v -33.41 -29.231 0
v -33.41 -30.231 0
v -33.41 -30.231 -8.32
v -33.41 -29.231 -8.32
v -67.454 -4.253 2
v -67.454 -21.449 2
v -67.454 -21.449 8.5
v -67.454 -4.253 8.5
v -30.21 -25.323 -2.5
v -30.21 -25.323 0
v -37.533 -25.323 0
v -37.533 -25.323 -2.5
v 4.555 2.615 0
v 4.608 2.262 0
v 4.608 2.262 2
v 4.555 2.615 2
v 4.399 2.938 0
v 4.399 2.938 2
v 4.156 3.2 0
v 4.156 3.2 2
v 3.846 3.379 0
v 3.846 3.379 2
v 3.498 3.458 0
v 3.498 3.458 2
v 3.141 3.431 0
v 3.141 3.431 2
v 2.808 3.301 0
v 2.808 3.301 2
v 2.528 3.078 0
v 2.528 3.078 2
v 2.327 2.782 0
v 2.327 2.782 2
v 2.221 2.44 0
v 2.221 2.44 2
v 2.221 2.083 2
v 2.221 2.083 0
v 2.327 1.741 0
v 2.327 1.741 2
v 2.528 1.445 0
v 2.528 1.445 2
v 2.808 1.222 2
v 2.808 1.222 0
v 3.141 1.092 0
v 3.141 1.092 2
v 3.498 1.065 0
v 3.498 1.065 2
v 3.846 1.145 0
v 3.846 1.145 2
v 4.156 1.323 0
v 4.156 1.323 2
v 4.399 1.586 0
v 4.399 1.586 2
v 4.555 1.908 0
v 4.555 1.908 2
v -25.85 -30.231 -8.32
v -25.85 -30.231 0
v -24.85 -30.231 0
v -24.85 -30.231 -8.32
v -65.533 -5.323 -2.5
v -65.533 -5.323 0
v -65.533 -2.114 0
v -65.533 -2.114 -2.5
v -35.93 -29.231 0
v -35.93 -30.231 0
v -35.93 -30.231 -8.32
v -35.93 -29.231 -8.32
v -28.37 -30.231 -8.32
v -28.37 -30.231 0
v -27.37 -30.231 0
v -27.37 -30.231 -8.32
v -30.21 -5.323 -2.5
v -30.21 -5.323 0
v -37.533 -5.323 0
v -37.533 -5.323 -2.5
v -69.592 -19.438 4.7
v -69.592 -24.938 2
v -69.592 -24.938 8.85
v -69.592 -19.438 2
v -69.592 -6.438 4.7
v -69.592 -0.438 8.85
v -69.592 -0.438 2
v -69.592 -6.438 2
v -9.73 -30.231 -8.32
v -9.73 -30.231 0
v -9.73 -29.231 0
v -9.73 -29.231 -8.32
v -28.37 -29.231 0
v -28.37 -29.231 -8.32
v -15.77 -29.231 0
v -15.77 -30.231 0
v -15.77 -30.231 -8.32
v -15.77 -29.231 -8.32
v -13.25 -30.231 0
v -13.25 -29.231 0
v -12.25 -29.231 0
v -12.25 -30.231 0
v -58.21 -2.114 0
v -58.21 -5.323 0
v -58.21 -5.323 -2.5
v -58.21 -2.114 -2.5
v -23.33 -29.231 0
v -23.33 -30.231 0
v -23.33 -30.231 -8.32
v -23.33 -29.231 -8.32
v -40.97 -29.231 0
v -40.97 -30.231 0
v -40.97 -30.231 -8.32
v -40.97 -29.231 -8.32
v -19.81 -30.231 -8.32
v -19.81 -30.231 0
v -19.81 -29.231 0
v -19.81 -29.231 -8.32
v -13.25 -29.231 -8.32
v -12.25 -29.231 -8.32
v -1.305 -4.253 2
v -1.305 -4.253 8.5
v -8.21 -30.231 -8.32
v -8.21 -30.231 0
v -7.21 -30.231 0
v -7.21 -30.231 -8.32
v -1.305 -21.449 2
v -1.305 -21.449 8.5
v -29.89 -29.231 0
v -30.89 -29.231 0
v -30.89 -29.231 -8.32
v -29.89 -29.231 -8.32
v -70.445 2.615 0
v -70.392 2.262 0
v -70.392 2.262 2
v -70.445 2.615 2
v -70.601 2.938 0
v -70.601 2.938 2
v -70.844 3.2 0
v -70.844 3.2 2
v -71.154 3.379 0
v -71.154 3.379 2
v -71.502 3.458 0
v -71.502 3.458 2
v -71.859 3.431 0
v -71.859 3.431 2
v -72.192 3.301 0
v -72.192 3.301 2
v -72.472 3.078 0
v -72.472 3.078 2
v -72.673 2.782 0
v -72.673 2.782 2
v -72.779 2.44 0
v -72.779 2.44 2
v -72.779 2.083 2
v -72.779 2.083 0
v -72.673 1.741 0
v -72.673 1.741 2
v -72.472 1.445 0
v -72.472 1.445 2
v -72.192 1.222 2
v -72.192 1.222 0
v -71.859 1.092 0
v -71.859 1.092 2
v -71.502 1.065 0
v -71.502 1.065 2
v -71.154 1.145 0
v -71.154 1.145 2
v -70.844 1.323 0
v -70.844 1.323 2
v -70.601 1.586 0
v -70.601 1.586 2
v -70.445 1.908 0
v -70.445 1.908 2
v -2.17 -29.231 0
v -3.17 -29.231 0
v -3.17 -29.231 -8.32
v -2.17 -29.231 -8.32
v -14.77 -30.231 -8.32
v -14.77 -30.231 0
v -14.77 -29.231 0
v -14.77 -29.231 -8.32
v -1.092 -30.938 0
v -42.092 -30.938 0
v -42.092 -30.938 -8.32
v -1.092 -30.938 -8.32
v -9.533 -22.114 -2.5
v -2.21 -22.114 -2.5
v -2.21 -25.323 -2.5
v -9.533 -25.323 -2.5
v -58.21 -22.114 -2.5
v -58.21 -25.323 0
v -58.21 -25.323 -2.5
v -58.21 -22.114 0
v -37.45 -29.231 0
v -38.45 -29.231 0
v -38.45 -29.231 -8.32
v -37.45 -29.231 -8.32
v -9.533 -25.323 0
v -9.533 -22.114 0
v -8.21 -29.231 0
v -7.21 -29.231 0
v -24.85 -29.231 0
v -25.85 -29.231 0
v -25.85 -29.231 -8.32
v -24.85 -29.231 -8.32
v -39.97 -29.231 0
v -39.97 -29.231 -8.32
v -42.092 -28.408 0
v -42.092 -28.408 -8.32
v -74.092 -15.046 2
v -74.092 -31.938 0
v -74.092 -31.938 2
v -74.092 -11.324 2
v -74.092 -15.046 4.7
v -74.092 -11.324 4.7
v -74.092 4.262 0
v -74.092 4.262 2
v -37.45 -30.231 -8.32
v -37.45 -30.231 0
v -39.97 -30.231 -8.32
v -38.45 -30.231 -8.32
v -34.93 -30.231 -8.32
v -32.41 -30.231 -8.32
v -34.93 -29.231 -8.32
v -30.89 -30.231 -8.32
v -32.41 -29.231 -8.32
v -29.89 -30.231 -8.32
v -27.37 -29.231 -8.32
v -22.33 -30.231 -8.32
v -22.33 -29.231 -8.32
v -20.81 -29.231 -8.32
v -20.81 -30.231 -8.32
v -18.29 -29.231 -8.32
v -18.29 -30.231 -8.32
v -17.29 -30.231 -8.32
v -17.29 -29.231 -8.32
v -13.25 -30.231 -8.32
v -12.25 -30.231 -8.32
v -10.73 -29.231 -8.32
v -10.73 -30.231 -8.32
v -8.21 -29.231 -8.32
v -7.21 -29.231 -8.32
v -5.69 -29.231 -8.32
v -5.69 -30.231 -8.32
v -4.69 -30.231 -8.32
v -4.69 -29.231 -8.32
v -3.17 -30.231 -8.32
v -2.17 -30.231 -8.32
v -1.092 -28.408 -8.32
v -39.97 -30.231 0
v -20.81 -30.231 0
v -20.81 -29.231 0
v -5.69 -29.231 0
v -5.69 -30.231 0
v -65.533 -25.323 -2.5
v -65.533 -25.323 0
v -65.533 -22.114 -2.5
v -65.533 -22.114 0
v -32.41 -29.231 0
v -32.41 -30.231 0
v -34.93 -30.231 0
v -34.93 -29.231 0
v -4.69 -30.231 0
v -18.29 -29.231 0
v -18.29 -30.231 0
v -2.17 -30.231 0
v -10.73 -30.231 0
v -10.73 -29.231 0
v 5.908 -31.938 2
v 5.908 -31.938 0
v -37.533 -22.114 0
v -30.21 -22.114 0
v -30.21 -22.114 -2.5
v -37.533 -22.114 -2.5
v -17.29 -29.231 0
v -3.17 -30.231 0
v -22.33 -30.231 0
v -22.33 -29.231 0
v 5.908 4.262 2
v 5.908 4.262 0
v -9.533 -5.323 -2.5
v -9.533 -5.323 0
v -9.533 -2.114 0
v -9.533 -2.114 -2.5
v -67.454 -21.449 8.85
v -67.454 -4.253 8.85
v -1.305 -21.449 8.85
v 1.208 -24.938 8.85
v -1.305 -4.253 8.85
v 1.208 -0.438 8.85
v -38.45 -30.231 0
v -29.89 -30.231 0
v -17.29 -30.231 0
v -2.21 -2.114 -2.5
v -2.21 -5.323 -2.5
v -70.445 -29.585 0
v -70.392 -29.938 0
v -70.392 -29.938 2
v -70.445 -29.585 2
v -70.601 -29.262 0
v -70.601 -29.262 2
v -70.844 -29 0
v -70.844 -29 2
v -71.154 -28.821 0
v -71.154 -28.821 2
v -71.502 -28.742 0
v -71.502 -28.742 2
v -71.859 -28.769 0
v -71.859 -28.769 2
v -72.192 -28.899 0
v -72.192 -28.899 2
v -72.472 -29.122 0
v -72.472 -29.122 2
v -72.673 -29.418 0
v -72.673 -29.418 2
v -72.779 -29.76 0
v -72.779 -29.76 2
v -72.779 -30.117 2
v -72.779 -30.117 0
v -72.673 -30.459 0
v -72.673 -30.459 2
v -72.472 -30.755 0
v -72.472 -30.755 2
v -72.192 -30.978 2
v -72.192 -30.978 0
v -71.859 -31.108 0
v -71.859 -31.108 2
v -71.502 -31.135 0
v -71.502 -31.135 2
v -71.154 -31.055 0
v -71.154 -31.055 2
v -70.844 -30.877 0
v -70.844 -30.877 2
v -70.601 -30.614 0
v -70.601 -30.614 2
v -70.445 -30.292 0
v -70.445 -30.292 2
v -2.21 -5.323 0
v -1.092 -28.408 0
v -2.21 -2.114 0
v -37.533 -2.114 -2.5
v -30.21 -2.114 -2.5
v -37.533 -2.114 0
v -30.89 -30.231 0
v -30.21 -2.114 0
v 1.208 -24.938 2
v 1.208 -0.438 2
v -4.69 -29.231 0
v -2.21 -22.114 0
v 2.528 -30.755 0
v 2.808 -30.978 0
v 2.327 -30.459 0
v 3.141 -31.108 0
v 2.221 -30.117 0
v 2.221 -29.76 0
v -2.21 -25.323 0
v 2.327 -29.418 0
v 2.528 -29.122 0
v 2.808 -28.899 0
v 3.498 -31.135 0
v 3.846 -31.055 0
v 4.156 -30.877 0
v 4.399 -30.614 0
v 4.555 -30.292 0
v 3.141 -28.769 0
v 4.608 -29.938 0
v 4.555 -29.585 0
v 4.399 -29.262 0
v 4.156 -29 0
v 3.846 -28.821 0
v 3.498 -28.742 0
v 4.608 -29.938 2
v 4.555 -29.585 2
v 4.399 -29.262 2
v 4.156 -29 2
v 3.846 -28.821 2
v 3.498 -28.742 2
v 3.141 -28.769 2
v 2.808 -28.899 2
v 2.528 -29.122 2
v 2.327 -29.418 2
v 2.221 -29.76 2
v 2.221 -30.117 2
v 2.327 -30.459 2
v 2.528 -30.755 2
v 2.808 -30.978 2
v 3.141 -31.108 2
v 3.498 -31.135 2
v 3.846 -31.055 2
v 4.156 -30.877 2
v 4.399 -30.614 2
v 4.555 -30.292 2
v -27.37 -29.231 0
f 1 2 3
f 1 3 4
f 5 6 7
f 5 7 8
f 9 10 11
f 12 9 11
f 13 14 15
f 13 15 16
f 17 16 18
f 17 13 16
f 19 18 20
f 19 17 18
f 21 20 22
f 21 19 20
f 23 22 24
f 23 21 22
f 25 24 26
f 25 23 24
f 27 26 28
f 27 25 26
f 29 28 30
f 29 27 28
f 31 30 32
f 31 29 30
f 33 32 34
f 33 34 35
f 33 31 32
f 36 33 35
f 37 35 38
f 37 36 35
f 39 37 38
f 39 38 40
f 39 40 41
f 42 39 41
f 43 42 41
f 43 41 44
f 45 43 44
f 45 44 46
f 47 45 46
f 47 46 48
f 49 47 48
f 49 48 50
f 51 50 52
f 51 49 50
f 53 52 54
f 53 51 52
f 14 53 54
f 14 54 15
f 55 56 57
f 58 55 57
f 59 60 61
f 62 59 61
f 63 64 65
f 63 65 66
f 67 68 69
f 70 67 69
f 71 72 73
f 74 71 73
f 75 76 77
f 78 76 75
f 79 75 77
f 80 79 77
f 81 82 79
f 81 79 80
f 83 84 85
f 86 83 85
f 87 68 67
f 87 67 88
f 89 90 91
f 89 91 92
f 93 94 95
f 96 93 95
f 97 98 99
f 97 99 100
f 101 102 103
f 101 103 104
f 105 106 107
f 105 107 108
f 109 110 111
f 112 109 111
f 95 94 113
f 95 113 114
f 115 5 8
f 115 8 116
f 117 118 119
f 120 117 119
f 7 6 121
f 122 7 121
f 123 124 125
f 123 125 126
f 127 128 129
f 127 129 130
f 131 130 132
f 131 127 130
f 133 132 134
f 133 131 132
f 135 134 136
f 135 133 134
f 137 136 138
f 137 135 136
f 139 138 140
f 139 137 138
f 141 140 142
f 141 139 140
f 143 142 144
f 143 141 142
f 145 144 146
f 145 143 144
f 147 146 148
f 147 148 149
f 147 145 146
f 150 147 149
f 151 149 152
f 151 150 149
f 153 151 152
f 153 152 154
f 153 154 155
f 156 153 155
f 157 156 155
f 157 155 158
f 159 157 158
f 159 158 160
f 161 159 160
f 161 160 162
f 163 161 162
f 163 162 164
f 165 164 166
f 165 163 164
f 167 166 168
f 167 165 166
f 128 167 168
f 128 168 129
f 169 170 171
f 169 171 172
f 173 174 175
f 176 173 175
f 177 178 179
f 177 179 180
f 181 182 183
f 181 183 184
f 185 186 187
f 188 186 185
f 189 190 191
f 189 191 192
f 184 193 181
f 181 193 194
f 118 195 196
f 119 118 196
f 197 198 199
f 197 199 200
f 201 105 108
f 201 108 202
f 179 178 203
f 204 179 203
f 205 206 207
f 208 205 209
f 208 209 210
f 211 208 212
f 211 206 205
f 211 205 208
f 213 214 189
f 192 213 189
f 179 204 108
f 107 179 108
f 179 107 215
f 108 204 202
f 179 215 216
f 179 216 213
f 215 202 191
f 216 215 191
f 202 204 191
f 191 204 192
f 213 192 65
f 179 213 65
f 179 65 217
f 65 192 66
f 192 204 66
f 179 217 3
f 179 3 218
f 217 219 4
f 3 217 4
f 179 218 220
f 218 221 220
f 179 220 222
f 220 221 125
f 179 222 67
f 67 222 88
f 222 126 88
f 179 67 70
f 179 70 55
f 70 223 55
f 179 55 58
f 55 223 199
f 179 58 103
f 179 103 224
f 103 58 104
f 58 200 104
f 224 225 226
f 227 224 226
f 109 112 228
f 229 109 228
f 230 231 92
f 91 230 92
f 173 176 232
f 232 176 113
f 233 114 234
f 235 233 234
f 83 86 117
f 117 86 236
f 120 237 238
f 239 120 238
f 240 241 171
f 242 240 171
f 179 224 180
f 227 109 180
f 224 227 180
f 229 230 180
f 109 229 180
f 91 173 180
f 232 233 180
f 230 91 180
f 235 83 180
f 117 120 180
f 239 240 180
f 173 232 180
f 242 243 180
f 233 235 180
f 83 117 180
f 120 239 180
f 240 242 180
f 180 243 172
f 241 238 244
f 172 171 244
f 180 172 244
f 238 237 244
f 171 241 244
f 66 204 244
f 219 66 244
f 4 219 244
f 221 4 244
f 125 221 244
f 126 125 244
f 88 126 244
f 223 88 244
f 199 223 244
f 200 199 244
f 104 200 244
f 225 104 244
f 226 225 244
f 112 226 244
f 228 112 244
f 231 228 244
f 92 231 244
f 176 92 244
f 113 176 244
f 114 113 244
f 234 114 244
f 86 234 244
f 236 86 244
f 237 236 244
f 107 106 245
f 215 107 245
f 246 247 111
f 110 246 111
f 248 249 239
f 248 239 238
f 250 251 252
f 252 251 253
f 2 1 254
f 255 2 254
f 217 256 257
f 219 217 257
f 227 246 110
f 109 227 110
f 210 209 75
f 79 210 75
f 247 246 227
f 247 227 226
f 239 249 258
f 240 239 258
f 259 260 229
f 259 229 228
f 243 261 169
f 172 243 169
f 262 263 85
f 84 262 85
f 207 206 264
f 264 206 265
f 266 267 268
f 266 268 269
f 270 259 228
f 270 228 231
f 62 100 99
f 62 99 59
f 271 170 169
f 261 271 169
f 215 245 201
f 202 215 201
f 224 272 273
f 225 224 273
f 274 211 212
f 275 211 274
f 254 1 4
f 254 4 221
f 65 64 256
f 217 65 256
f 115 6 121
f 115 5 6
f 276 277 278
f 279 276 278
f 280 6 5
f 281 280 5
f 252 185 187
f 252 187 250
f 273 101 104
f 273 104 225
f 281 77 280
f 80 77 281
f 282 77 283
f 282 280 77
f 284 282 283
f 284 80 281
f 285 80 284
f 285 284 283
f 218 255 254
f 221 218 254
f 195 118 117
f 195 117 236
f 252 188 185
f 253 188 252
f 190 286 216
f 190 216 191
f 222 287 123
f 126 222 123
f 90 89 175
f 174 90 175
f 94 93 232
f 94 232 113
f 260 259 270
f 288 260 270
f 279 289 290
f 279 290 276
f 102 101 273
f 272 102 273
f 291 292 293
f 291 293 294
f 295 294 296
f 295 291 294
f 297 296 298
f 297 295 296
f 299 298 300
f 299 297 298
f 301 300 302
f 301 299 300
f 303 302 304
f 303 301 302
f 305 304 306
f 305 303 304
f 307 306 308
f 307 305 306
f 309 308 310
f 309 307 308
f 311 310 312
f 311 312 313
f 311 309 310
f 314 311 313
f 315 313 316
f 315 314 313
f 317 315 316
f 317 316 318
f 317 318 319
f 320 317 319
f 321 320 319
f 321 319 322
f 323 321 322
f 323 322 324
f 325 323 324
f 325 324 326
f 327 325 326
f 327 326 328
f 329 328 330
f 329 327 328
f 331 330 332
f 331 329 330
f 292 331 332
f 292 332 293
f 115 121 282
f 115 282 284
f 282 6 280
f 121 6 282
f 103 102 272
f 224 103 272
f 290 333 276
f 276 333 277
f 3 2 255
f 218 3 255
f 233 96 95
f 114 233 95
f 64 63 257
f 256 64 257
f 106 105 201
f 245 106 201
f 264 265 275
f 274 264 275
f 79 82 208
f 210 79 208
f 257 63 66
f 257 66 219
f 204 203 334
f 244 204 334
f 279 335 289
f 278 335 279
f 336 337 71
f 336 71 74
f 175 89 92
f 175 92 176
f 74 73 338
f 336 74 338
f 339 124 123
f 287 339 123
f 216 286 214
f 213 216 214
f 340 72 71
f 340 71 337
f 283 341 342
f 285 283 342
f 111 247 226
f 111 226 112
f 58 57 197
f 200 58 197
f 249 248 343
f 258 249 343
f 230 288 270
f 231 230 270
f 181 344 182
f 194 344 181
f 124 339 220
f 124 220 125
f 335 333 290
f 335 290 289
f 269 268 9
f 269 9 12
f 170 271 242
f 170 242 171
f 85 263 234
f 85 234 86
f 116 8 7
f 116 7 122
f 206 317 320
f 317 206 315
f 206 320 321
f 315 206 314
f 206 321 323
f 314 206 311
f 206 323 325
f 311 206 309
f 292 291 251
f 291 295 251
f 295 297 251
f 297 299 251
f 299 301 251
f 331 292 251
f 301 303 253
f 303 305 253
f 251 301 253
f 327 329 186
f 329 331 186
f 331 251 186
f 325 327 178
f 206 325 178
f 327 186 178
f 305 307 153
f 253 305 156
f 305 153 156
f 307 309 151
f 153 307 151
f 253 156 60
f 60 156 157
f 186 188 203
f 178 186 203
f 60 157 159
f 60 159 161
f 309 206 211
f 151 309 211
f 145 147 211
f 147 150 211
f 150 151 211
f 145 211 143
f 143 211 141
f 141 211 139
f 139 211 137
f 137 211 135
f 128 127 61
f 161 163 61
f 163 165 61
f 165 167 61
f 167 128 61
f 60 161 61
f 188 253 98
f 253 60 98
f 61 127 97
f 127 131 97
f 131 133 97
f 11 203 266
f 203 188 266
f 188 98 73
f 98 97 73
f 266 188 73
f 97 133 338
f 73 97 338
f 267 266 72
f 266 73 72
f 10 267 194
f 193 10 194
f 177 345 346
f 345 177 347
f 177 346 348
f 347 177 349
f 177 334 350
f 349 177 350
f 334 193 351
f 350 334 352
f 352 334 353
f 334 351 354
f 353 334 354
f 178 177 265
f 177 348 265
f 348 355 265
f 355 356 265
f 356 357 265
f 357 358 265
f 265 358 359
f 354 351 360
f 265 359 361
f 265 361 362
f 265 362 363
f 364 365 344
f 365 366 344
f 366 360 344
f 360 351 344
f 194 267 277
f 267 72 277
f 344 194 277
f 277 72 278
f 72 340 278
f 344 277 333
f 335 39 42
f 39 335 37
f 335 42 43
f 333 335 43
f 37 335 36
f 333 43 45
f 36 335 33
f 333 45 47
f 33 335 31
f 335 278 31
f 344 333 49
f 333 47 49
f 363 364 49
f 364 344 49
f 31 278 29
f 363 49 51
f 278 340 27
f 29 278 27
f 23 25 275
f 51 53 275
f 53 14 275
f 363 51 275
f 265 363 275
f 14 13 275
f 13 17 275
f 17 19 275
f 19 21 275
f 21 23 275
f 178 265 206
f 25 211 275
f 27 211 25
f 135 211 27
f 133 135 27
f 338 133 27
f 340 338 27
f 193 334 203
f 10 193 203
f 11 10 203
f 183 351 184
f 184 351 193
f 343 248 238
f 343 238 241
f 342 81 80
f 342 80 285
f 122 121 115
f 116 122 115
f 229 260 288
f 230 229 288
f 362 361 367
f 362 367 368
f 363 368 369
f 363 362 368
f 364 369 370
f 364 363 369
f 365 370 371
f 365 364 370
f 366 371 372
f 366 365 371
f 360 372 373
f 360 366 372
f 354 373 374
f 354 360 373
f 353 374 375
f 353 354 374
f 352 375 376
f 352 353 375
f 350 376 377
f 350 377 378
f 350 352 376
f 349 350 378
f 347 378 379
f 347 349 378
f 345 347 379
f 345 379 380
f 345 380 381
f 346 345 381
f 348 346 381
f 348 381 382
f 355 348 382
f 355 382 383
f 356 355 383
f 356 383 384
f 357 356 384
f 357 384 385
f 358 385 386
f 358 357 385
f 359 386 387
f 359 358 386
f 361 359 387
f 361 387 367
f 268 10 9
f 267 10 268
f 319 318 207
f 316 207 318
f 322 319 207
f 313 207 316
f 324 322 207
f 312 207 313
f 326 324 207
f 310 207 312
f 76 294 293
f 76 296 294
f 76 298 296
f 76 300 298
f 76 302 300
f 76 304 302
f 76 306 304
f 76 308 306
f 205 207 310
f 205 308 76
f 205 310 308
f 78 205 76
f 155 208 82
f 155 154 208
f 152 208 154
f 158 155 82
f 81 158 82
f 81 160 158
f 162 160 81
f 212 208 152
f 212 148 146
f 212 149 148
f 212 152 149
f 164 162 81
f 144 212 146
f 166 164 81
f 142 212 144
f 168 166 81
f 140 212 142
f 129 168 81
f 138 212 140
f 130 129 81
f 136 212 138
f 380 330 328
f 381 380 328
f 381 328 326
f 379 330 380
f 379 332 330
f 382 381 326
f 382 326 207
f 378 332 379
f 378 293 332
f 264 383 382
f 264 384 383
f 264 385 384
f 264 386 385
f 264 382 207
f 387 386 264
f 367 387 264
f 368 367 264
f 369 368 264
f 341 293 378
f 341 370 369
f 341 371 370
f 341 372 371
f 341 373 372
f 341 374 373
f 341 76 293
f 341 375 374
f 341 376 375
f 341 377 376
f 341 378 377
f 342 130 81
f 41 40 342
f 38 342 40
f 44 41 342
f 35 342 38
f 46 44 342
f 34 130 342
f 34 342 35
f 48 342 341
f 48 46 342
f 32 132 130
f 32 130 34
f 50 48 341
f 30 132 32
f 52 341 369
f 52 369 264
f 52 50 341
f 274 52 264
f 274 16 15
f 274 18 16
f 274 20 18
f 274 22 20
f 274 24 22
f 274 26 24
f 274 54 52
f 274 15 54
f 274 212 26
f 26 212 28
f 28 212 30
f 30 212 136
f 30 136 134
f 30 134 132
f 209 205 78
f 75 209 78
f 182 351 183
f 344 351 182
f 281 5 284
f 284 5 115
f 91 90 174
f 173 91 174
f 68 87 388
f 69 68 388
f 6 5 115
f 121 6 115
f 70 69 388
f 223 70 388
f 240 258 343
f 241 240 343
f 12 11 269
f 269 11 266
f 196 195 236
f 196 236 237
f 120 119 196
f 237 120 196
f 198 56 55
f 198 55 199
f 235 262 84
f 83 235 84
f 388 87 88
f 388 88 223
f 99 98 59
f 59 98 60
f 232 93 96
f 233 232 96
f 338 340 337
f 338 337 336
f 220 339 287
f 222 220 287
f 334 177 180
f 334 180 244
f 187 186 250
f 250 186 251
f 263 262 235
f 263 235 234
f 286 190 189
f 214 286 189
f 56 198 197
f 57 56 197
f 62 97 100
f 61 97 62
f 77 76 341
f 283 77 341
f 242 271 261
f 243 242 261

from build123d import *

# Parameters (mm, degrees)
SKETCH_2_W      = 80
SKETCH_2_H      = 36.2
SKETCH_2_R      = 1.2
EXTRUDE_1_DEPTH = 2
SKETCH_3_W      = 70.8
SKETCH_3_H      = 24.5
SKETCH_3_W_2    = 66.149074023
SKETCH_3_H_2    = 17.195468247
EXTRUDE_2_DEPTH = 8.849661681
SKETCH_4_W      = 66.149074023
SKETCH_4_H      = 17.195468247
EXTRUDE_3_DEPTH = 6.5
SKETCH_6_W      = 41
SKETCH_6_H      = 2.53
SKETCH_6_W_2    = 1
SKETCH_6_H_2    = 1
EXTRUDE_4_DEPTH = 10.32
EXTRUDE_5_DEPTH = 2.7
SKETCH_8_W      = 7.322472125
SKETCH_8_H      = 3.20872374
EXTRUDE_6_DEPTH = 2.5


with BuildPart() as part:
    # 草图2 → 凸台-拉伸1 (new body)
    with BuildSketch(Plane.XY):
        with Locations((-34.091991963, -13.838432836)):
            Rectangle(SKETCH_2_W, SKETCH_2_H)
        with Locations((3.408008037, -29.938432836)):
            Circle(SKETCH_2_R, mode=Mode.SUBTRACT)
        with Locations((-71.591991963, 2.261567164)):
            Circle(SKETCH_2_R, mode=Mode.SUBTRACT)
        with Locations((3.408008037, 2.261567164)):
            Circle(SKETCH_2_R, mode=Mode.SUBTRACT)
        with Locations((-71.591991963, -29.938432836)):
            Circle(SKETCH_2_R, mode=Mode.SUBTRACT)
    extrude(amount=EXTRUDE_1_DEPTH)

    # 草图3 → 凸台-拉伸2 (add)
    with BuildSketch(Plane.XY):
        with Locations((-34.191991963, -12.688432836)):
            Rectangle(SKETCH_3_W, SKETCH_3_H)
        with Locations((-34.379954351, -12.851133223)):
            Rectangle(SKETCH_3_W_2, SKETCH_3_H_2, mode=Mode.SUBTRACT)
    extrude(amount=EXTRUDE_2_DEPTH)

    # 草图6 → 凸台-拉伸4 (add)
    with BuildSketch(Plane.XY.offset(2)):
        with Locations((-21.591991963, -29.673432836)):
            Rectangle(SKETCH_6_W, SKETCH_6_H)
        with Locations((-5.190328845, -29.731482843)):
            Rectangle(SKETCH_6_W_2, SKETCH_6_H_2, mode=Mode.SUBTRACT)
        with Locations((-2.670328845, -29.731482843)):
            Rectangle(SKETCH_6_W_2, SKETCH_6_H_2, mode=Mode.SUBTRACT)
        with Locations((-7.710328845, -29.731482843)):
            Rectangle(SKETCH_6_W_2, SKETCH_6_H_2, mode=Mode.SUBTRACT)
        with Locations((-10.230328845, -29.731482843)):
            Rectangle(SKETCH_6_W_2, SKETCH_6_H_2, mode=Mode.SUBTRACT)
        with Locations((-12.750328845, -29.731482843)):
            Rectangle(SKETCH_6_W_2, SKETCH_6_H_2, mode=Mode.SUBTRACT)
        with Locations((-15.270328845, -29.731482843)):
            Rectangle(SKETCH_6_W_2, SKETCH_6_H_2, mode=Mode.SUBTRACT)
        with Locations((-17.790328845, -29.731482843)):
            Rectangle(SKETCH_6_W_2, SKETCH_6_H_2, mode=Mode.SUBTRACT)
        with Locations((-20.310328845, -29.731482843)):
            Rectangle(SKETCH_6_W_2, SKETCH_6_H_2, mode=Mode.SUBTRACT)
        with Locations((-22.830328845, -29.731482843)):
            Rectangle(SKETCH_6_W_2, SKETCH_6_H_2, mode=Mode.SUBTRACT)
        with Locations((-25.350328845, -29.731482843)):
            Rectangle(SKETCH_6_W_2, SKETCH_6_H_2, mode=Mode.SUBTRACT)
        with Locations((-27.870328845, -29.731482843)):
            Rectangle(SKETCH_6_W_2, SKETCH_6_H_2, mode=Mode.SUBTRACT)
        with Locations((-30.390328845, -29.731482843)):
            Rectangle(SKETCH_6_W_2, SKETCH_6_H_2, mode=Mode.SUBTRACT)
        with Locations((-32.910328845, -29.731482843)):
            Rectangle(SKETCH_6_W_2, SKETCH_6_H_2, mode=Mode.SUBTRACT)
        with Locations((-35.430328845, -29.731482843)):
            Rectangle(SKETCH_6_W_2, SKETCH_6_H_2, mode=Mode.SUBTRACT)
        with Locations((-37.950328845, -29.731482843)):
            Rectangle(SKETCH_6_W_2, SKETCH_6_H_2, mode=Mode.SUBTRACT)
        with Locations((-40.470328845, -29.731482843)):
            Rectangle(SKETCH_6_W_2, SKETCH_6_H_2, mode=Mode.SUBTRACT)
    extrude(amount=-EXTRUDE_4_DEPTH)

    # 草图7 → 凸台-拉伸5 (add)
    with BuildSketch(Plane.XY.offset(2)):
        Polygon((-69.591991963, -19.438432836), (-69.591991963, -6.438432836), (-74.091991963, -11.324147122), (-74.091991963, -15.045770955), align=None)
    extrude(amount=EXTRUDE_5_DEPTH)

    # 草图8 → 凸台-拉伸6 (add)
    with BuildSketch(Plane(origin=(0, 0, 0), x_dir=(-1, 0, 0), z_dir=(0, 0, -1))):
        with Locations((33.871678046, -3.71861181)):
            Rectangle(SKETCH_8_W, SKETCH_8_H)
        with Locations((5.871678045, -3.71861181)):
            Rectangle(SKETCH_8_W, SKETCH_8_H)
        with Locations((61.871678046, -3.71861181)):
            Rectangle(SKETCH_8_W, SKETCH_8_H)
        with Locations((33.871678046, -23.71861181)):
            Rectangle(SKETCH_8_W, SKETCH_8_H)
        with Locations((61.871678046, -23.71861181)):
            Rectangle(SKETCH_8_W, SKETCH_8_H)
        with Locations((5.871678045, -23.71861181)):
            Rectangle(SKETCH_8_W, SKETCH_8_H)
    extrude(amount=EXTRUDE_6_DEPTH)


with BuildPart() as body_2:
    # 草图4 → 凸台-拉伸3 (new body)
    with BuildSketch(Plane.XY.offset(2)):
        with Locations((-34.379954351, -12.851133223)):
            Rectangle(SKETCH_4_W, SKETCH_4_H)
    extrude(amount=EXTRUDE_3_DEPTH)


solid = Compound([part.part, body_2.part])
